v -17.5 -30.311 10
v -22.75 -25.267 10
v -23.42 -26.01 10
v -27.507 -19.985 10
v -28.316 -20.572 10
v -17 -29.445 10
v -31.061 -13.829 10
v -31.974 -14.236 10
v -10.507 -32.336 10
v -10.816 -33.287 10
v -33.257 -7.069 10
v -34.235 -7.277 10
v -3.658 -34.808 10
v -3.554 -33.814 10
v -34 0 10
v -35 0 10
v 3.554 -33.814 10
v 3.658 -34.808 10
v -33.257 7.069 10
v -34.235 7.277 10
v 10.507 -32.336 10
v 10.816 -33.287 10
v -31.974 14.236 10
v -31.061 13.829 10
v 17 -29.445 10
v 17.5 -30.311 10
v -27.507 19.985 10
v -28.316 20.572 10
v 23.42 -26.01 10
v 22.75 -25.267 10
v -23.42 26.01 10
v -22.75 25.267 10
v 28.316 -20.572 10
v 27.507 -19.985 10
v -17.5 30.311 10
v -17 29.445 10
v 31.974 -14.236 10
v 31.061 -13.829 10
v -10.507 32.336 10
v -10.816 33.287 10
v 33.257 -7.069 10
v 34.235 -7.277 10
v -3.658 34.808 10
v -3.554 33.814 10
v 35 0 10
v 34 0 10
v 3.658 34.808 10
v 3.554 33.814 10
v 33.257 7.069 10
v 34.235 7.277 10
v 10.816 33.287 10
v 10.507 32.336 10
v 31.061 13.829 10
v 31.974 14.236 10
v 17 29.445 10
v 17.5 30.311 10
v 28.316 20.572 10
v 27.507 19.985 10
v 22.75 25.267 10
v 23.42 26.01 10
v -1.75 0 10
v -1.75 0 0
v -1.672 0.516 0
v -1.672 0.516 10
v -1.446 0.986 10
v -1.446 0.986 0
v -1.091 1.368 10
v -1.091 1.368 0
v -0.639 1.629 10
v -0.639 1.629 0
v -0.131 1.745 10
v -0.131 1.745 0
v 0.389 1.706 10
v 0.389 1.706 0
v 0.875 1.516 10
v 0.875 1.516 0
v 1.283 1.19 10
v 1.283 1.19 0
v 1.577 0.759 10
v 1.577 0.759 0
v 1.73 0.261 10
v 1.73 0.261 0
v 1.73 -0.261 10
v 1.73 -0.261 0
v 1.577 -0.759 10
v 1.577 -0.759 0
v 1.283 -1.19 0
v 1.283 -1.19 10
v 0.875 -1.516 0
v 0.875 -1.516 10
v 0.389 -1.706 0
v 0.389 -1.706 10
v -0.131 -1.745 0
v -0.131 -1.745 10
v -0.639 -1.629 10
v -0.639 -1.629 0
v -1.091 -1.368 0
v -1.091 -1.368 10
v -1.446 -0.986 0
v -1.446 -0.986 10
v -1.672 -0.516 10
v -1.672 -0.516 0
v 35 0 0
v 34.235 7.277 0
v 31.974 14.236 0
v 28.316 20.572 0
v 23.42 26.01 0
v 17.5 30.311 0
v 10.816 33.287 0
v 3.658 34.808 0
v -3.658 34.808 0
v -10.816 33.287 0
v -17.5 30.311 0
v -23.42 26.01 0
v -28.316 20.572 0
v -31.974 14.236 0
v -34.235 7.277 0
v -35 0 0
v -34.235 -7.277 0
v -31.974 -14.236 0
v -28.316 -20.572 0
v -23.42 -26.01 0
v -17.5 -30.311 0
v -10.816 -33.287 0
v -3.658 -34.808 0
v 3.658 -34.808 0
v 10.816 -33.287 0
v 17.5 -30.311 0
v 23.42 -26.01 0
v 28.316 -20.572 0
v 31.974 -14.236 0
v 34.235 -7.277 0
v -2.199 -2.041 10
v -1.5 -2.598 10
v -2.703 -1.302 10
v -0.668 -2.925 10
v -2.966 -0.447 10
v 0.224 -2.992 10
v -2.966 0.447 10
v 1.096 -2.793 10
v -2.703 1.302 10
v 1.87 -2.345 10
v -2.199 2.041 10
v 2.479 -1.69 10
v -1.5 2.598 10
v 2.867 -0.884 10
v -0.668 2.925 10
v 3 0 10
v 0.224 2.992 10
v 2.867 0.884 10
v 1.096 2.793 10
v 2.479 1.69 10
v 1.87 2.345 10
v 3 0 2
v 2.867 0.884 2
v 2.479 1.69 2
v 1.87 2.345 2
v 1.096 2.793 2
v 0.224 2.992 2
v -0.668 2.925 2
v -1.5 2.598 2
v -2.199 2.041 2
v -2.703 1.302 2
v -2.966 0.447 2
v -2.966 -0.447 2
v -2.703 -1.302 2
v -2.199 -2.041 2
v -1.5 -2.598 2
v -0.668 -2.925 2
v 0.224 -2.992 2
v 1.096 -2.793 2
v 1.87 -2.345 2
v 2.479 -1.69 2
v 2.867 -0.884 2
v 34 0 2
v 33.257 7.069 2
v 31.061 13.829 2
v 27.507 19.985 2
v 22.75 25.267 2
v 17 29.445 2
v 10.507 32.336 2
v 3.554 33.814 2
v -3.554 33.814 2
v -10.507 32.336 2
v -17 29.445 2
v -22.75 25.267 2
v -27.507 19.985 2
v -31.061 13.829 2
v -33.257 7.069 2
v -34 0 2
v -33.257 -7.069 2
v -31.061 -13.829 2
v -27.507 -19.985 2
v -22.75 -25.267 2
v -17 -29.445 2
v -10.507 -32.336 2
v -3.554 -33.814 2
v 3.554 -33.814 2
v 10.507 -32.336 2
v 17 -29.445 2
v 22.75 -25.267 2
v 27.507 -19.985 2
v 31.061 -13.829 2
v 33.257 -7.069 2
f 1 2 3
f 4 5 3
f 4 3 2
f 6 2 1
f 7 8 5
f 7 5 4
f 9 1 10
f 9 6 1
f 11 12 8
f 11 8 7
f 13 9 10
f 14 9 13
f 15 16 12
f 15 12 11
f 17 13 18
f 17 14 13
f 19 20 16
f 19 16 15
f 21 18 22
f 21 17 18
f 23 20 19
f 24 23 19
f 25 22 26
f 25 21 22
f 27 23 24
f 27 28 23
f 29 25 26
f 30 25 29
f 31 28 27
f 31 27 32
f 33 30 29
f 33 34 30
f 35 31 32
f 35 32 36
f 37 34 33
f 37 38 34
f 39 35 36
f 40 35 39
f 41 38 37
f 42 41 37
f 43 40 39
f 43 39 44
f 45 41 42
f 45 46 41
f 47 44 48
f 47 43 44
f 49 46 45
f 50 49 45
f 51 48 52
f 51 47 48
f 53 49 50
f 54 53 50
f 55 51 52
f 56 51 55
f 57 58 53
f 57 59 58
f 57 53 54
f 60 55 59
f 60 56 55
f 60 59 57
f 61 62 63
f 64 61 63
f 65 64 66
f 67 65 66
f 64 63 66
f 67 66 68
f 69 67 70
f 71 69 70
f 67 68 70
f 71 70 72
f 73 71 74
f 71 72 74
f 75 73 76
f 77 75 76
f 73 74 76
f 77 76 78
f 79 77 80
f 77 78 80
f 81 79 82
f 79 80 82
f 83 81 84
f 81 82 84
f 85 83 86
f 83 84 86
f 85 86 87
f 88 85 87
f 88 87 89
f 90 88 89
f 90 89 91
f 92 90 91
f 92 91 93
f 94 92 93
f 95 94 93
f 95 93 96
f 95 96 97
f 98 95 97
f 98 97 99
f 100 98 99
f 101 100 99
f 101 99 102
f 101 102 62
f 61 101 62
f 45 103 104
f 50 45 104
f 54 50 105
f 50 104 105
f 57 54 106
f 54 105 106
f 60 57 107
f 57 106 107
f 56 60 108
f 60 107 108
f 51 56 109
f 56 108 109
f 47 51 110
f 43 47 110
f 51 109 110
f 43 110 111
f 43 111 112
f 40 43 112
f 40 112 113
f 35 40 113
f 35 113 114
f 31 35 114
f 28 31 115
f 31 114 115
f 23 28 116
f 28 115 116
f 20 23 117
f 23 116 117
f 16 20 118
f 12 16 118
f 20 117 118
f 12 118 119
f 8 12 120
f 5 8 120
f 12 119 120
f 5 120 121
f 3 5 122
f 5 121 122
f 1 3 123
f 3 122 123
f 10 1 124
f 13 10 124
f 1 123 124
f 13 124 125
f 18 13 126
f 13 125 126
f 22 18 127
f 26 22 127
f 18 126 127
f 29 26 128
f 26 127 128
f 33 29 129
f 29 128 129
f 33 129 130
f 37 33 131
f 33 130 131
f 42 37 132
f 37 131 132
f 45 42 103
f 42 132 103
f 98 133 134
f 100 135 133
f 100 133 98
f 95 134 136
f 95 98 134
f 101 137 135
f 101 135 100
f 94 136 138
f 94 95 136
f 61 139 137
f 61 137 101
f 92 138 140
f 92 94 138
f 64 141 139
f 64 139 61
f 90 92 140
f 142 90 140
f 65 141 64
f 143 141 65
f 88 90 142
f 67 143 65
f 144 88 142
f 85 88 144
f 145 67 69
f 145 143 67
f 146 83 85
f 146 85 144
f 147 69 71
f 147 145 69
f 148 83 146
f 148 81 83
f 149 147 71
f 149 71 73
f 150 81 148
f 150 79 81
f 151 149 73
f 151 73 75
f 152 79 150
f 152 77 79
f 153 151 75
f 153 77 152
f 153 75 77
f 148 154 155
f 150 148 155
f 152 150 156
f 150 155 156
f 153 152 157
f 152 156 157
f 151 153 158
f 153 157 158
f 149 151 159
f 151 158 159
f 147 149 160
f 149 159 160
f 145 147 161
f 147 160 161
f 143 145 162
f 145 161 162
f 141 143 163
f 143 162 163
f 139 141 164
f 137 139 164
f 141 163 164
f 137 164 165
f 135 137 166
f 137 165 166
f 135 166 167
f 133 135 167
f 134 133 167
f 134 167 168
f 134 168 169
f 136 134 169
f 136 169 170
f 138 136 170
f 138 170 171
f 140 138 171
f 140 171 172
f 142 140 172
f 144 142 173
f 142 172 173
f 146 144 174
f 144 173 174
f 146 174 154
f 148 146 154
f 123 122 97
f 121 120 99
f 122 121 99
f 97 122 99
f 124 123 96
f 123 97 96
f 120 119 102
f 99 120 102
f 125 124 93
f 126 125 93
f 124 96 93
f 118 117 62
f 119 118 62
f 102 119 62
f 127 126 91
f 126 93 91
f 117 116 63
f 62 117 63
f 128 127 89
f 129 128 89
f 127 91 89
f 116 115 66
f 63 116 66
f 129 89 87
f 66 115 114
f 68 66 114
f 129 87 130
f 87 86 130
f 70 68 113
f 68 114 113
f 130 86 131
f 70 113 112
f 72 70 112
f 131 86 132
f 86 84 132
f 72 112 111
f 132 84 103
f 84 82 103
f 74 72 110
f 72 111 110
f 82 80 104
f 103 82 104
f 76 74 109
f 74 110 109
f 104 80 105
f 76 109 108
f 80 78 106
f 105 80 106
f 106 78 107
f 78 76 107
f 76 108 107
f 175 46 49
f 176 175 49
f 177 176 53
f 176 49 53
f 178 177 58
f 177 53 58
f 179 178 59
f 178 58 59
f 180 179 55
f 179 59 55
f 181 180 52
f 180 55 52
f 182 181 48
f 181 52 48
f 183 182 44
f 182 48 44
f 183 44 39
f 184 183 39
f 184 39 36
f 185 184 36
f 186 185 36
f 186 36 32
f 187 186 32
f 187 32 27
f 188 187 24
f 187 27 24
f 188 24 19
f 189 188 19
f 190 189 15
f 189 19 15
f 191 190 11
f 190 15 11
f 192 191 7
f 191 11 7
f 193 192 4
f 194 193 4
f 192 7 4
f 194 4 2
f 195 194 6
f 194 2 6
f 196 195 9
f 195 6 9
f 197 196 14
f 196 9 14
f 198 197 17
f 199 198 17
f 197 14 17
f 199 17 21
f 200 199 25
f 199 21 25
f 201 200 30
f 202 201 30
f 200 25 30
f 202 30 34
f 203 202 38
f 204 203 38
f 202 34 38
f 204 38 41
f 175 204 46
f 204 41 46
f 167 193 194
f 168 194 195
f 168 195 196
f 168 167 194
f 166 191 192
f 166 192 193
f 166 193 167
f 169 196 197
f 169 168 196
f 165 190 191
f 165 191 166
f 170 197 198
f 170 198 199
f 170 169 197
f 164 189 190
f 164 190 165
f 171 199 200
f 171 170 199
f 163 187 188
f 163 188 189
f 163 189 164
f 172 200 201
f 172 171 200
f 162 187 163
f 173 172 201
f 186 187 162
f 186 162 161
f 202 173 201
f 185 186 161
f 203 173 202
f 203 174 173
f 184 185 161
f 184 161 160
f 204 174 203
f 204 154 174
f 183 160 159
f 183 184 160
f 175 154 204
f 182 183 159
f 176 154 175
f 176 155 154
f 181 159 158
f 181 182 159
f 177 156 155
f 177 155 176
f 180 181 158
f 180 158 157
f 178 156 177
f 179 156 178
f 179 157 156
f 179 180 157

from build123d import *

# Parameters (mm, degrees)
F0_R     = 35
F1_DEPTH = 10
F2_R     = 34
F3_DEPTH = 8
F4_R     = 3
F5_DEPTH = 8
F7_D     = 3.5


with BuildPart() as f1:
    # F0 (on Top) → F1 (new body)
    with BuildSketch(Plane.XY):
        Circle(F0_R)
    extrude(amount=F1_DEPTH)

    # F2 (on face) → F3 (cut)
    with BuildSketch(Plane.XY.offset(10)):
        Circle(F2_R)
    extrude(amount=-F3_DEPTH, mode=Mode.SUBTRACT)

    # F4 (on face) → F5 (join)
    with BuildSketch(Plane.XY.offset(2)):
        Circle(F4_R)
    extrude(amount=F5_DEPTH)

    # F7 (through all)
    with Locations(Plane.XY.offset(10)):
        with Locations((0, 0)):
            Hole(F7_D / 2)


solid = f1.part
